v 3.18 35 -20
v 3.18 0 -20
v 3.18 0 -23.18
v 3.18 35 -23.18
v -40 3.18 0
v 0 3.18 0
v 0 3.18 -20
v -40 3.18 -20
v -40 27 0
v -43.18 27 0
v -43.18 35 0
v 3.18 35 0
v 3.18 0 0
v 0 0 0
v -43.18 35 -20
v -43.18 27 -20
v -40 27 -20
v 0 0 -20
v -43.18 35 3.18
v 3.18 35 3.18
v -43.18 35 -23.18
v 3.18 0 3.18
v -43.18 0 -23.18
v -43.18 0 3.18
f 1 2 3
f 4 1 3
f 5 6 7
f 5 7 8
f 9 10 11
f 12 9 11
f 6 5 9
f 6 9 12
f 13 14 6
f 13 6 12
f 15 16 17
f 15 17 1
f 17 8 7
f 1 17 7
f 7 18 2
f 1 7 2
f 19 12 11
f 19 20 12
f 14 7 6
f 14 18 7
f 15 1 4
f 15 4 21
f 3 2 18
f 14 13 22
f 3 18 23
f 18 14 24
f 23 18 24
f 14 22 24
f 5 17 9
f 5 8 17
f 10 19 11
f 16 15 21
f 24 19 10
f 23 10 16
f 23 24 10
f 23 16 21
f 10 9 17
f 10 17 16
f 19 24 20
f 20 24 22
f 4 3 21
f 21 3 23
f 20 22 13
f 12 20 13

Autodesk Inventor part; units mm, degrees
ref_plane "YZ Plane" through (0, 0, 0) normal (1, 0, 0) x (0, 1, 0)
ref_plane "XZ Plane" through (0, 0, 0) normal (0, 1, 0) x (-1, 0, 0)
ref_plane "XY Plane" through (0, 0, 0) normal (0, 0, 1) x (1, 0, 0)
sketch "Sketch2" plane through (0, 0, 0) normal (0, 1, 0) x (-1, 0, 0)
  line L0 (0, 0) -> (40, 0)
  line L1 (40, 0) -> (40, -20)
  line L2 (40, -20) -> (0, -20)
  line L3 (0, -20) -> (0, 0)
  dimension "d25" = 40
  dimension "d26" = 20
extrude "Extrusion1" add sketch "Sketch2" along normal blind 3.18
sketch "Sketch5" plane through (0, 0, 0) normal (0, 1, 0) x (-1, 0, 0)
  line L0 (40, 0) -> (0, 0) projected
  line L1 (0, 0) -> (0, -20) projected
  line L2 (0, -20) -> (40, -20) projected
  line L3 (40, -20) -> (40, 0) projected
  line L4 (-3.18, 0) -> (43.18, 0)
  line L5 (43.18, 0) -> (43.18, 3.18)
  line L6 (43.18, 3.18) -> (-3.18, 3.18)
  line L7 (-3.18, 3.18) -> (-3.18, 0)
  line L8 (43.18, -20) -> (-3.18, -20)
  line L9 (-3.18, -20) -> (-3.18, -23.18)
  line L10 (-3.18, -23.18) -> (43.18, -23.18)
  line L11 (43.18, -23.18) -> (43.18, -20)
  dimension "d34" = 3.18
  dimension "d35" = 3.18
  dimension "d36" = 3.18
extrude "Extrusion2" add sketch "Sketch5" along normal blind 35 contours L0 L4 L7 L6 L5 | L8 L11 L10 L9 L2
sketch "Sketch6" plane through (0, 0, 0) normal (0, 1, 0) x (-1, 0, 0)
  line L0 (40, 0) -> (0, 0) projected
  line L1 (0, 0) -> (0, -20) projected
  line L2 (0, -20) -> (40, -20) projected
  line L3 (40, -20) -> (40, 0) projected
  line L4 (40, 0) -> (43.18, 0)
  line L5 (43.18, 0) -> (43.18, -20)
  line L6 (43.18, -20) -> (40, -20)
  line L7 (40, -20) -> (40, 0)
  dimension "d39" = 3.18
  dimension "d40" = 20
extrude "Extrusion3" add sketch "Sketch6" along normal blind 27 contours L4 L5 L6 L3
properties part number "Base_servo1"
